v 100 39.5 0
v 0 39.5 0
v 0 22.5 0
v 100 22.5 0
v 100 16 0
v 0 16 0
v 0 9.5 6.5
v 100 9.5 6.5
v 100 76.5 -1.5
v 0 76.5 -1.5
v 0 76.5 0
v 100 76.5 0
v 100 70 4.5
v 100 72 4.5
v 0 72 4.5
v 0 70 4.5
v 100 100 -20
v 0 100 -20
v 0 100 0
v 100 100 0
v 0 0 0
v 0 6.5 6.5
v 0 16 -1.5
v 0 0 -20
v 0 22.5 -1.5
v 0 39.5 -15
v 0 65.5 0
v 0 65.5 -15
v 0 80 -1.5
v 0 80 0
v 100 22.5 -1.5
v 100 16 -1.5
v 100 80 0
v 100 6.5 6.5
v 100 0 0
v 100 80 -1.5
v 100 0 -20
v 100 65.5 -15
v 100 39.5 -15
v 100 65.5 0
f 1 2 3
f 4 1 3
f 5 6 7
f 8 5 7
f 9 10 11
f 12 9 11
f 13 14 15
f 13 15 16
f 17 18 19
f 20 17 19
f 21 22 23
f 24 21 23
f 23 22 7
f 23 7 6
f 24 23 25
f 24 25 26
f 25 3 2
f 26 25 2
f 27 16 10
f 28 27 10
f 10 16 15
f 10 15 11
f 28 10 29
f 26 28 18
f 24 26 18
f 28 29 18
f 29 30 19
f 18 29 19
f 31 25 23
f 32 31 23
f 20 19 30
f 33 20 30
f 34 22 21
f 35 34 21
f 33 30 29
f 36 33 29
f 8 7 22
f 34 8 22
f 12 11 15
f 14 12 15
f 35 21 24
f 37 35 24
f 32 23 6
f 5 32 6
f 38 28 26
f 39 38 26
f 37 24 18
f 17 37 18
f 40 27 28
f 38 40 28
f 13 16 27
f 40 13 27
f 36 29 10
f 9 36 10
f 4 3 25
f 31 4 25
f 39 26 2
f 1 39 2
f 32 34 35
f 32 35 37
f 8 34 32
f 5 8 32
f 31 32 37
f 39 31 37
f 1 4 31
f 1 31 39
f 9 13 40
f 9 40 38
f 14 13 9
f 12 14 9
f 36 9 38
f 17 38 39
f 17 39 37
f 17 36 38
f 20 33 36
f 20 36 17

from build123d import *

# Parameters (mm, degrees)
F1_DEPTH = 100


with BuildPart() as f1:
    # F0 (on Right) → F1 (new body)
    with BuildSketch(Plane.YZ):
        Polygon((6.5, 6.5), (0, 0), (0, -20), (100, -20), (100, 0), (80, 0), (80, -1.5), (76.5, -1.5), (76.5, 0), (72, 4.5), (70, 4.5), (65.5, 0), (65.5, -15), (39.5, -15), (39.5, 0), (22.5, 0), (22.5, -1.5), (16, -1.5), (16, 0), (9.5, 6.5), align=None)
    extrude(amount=F1_DEPTH)


solid = f1.part
